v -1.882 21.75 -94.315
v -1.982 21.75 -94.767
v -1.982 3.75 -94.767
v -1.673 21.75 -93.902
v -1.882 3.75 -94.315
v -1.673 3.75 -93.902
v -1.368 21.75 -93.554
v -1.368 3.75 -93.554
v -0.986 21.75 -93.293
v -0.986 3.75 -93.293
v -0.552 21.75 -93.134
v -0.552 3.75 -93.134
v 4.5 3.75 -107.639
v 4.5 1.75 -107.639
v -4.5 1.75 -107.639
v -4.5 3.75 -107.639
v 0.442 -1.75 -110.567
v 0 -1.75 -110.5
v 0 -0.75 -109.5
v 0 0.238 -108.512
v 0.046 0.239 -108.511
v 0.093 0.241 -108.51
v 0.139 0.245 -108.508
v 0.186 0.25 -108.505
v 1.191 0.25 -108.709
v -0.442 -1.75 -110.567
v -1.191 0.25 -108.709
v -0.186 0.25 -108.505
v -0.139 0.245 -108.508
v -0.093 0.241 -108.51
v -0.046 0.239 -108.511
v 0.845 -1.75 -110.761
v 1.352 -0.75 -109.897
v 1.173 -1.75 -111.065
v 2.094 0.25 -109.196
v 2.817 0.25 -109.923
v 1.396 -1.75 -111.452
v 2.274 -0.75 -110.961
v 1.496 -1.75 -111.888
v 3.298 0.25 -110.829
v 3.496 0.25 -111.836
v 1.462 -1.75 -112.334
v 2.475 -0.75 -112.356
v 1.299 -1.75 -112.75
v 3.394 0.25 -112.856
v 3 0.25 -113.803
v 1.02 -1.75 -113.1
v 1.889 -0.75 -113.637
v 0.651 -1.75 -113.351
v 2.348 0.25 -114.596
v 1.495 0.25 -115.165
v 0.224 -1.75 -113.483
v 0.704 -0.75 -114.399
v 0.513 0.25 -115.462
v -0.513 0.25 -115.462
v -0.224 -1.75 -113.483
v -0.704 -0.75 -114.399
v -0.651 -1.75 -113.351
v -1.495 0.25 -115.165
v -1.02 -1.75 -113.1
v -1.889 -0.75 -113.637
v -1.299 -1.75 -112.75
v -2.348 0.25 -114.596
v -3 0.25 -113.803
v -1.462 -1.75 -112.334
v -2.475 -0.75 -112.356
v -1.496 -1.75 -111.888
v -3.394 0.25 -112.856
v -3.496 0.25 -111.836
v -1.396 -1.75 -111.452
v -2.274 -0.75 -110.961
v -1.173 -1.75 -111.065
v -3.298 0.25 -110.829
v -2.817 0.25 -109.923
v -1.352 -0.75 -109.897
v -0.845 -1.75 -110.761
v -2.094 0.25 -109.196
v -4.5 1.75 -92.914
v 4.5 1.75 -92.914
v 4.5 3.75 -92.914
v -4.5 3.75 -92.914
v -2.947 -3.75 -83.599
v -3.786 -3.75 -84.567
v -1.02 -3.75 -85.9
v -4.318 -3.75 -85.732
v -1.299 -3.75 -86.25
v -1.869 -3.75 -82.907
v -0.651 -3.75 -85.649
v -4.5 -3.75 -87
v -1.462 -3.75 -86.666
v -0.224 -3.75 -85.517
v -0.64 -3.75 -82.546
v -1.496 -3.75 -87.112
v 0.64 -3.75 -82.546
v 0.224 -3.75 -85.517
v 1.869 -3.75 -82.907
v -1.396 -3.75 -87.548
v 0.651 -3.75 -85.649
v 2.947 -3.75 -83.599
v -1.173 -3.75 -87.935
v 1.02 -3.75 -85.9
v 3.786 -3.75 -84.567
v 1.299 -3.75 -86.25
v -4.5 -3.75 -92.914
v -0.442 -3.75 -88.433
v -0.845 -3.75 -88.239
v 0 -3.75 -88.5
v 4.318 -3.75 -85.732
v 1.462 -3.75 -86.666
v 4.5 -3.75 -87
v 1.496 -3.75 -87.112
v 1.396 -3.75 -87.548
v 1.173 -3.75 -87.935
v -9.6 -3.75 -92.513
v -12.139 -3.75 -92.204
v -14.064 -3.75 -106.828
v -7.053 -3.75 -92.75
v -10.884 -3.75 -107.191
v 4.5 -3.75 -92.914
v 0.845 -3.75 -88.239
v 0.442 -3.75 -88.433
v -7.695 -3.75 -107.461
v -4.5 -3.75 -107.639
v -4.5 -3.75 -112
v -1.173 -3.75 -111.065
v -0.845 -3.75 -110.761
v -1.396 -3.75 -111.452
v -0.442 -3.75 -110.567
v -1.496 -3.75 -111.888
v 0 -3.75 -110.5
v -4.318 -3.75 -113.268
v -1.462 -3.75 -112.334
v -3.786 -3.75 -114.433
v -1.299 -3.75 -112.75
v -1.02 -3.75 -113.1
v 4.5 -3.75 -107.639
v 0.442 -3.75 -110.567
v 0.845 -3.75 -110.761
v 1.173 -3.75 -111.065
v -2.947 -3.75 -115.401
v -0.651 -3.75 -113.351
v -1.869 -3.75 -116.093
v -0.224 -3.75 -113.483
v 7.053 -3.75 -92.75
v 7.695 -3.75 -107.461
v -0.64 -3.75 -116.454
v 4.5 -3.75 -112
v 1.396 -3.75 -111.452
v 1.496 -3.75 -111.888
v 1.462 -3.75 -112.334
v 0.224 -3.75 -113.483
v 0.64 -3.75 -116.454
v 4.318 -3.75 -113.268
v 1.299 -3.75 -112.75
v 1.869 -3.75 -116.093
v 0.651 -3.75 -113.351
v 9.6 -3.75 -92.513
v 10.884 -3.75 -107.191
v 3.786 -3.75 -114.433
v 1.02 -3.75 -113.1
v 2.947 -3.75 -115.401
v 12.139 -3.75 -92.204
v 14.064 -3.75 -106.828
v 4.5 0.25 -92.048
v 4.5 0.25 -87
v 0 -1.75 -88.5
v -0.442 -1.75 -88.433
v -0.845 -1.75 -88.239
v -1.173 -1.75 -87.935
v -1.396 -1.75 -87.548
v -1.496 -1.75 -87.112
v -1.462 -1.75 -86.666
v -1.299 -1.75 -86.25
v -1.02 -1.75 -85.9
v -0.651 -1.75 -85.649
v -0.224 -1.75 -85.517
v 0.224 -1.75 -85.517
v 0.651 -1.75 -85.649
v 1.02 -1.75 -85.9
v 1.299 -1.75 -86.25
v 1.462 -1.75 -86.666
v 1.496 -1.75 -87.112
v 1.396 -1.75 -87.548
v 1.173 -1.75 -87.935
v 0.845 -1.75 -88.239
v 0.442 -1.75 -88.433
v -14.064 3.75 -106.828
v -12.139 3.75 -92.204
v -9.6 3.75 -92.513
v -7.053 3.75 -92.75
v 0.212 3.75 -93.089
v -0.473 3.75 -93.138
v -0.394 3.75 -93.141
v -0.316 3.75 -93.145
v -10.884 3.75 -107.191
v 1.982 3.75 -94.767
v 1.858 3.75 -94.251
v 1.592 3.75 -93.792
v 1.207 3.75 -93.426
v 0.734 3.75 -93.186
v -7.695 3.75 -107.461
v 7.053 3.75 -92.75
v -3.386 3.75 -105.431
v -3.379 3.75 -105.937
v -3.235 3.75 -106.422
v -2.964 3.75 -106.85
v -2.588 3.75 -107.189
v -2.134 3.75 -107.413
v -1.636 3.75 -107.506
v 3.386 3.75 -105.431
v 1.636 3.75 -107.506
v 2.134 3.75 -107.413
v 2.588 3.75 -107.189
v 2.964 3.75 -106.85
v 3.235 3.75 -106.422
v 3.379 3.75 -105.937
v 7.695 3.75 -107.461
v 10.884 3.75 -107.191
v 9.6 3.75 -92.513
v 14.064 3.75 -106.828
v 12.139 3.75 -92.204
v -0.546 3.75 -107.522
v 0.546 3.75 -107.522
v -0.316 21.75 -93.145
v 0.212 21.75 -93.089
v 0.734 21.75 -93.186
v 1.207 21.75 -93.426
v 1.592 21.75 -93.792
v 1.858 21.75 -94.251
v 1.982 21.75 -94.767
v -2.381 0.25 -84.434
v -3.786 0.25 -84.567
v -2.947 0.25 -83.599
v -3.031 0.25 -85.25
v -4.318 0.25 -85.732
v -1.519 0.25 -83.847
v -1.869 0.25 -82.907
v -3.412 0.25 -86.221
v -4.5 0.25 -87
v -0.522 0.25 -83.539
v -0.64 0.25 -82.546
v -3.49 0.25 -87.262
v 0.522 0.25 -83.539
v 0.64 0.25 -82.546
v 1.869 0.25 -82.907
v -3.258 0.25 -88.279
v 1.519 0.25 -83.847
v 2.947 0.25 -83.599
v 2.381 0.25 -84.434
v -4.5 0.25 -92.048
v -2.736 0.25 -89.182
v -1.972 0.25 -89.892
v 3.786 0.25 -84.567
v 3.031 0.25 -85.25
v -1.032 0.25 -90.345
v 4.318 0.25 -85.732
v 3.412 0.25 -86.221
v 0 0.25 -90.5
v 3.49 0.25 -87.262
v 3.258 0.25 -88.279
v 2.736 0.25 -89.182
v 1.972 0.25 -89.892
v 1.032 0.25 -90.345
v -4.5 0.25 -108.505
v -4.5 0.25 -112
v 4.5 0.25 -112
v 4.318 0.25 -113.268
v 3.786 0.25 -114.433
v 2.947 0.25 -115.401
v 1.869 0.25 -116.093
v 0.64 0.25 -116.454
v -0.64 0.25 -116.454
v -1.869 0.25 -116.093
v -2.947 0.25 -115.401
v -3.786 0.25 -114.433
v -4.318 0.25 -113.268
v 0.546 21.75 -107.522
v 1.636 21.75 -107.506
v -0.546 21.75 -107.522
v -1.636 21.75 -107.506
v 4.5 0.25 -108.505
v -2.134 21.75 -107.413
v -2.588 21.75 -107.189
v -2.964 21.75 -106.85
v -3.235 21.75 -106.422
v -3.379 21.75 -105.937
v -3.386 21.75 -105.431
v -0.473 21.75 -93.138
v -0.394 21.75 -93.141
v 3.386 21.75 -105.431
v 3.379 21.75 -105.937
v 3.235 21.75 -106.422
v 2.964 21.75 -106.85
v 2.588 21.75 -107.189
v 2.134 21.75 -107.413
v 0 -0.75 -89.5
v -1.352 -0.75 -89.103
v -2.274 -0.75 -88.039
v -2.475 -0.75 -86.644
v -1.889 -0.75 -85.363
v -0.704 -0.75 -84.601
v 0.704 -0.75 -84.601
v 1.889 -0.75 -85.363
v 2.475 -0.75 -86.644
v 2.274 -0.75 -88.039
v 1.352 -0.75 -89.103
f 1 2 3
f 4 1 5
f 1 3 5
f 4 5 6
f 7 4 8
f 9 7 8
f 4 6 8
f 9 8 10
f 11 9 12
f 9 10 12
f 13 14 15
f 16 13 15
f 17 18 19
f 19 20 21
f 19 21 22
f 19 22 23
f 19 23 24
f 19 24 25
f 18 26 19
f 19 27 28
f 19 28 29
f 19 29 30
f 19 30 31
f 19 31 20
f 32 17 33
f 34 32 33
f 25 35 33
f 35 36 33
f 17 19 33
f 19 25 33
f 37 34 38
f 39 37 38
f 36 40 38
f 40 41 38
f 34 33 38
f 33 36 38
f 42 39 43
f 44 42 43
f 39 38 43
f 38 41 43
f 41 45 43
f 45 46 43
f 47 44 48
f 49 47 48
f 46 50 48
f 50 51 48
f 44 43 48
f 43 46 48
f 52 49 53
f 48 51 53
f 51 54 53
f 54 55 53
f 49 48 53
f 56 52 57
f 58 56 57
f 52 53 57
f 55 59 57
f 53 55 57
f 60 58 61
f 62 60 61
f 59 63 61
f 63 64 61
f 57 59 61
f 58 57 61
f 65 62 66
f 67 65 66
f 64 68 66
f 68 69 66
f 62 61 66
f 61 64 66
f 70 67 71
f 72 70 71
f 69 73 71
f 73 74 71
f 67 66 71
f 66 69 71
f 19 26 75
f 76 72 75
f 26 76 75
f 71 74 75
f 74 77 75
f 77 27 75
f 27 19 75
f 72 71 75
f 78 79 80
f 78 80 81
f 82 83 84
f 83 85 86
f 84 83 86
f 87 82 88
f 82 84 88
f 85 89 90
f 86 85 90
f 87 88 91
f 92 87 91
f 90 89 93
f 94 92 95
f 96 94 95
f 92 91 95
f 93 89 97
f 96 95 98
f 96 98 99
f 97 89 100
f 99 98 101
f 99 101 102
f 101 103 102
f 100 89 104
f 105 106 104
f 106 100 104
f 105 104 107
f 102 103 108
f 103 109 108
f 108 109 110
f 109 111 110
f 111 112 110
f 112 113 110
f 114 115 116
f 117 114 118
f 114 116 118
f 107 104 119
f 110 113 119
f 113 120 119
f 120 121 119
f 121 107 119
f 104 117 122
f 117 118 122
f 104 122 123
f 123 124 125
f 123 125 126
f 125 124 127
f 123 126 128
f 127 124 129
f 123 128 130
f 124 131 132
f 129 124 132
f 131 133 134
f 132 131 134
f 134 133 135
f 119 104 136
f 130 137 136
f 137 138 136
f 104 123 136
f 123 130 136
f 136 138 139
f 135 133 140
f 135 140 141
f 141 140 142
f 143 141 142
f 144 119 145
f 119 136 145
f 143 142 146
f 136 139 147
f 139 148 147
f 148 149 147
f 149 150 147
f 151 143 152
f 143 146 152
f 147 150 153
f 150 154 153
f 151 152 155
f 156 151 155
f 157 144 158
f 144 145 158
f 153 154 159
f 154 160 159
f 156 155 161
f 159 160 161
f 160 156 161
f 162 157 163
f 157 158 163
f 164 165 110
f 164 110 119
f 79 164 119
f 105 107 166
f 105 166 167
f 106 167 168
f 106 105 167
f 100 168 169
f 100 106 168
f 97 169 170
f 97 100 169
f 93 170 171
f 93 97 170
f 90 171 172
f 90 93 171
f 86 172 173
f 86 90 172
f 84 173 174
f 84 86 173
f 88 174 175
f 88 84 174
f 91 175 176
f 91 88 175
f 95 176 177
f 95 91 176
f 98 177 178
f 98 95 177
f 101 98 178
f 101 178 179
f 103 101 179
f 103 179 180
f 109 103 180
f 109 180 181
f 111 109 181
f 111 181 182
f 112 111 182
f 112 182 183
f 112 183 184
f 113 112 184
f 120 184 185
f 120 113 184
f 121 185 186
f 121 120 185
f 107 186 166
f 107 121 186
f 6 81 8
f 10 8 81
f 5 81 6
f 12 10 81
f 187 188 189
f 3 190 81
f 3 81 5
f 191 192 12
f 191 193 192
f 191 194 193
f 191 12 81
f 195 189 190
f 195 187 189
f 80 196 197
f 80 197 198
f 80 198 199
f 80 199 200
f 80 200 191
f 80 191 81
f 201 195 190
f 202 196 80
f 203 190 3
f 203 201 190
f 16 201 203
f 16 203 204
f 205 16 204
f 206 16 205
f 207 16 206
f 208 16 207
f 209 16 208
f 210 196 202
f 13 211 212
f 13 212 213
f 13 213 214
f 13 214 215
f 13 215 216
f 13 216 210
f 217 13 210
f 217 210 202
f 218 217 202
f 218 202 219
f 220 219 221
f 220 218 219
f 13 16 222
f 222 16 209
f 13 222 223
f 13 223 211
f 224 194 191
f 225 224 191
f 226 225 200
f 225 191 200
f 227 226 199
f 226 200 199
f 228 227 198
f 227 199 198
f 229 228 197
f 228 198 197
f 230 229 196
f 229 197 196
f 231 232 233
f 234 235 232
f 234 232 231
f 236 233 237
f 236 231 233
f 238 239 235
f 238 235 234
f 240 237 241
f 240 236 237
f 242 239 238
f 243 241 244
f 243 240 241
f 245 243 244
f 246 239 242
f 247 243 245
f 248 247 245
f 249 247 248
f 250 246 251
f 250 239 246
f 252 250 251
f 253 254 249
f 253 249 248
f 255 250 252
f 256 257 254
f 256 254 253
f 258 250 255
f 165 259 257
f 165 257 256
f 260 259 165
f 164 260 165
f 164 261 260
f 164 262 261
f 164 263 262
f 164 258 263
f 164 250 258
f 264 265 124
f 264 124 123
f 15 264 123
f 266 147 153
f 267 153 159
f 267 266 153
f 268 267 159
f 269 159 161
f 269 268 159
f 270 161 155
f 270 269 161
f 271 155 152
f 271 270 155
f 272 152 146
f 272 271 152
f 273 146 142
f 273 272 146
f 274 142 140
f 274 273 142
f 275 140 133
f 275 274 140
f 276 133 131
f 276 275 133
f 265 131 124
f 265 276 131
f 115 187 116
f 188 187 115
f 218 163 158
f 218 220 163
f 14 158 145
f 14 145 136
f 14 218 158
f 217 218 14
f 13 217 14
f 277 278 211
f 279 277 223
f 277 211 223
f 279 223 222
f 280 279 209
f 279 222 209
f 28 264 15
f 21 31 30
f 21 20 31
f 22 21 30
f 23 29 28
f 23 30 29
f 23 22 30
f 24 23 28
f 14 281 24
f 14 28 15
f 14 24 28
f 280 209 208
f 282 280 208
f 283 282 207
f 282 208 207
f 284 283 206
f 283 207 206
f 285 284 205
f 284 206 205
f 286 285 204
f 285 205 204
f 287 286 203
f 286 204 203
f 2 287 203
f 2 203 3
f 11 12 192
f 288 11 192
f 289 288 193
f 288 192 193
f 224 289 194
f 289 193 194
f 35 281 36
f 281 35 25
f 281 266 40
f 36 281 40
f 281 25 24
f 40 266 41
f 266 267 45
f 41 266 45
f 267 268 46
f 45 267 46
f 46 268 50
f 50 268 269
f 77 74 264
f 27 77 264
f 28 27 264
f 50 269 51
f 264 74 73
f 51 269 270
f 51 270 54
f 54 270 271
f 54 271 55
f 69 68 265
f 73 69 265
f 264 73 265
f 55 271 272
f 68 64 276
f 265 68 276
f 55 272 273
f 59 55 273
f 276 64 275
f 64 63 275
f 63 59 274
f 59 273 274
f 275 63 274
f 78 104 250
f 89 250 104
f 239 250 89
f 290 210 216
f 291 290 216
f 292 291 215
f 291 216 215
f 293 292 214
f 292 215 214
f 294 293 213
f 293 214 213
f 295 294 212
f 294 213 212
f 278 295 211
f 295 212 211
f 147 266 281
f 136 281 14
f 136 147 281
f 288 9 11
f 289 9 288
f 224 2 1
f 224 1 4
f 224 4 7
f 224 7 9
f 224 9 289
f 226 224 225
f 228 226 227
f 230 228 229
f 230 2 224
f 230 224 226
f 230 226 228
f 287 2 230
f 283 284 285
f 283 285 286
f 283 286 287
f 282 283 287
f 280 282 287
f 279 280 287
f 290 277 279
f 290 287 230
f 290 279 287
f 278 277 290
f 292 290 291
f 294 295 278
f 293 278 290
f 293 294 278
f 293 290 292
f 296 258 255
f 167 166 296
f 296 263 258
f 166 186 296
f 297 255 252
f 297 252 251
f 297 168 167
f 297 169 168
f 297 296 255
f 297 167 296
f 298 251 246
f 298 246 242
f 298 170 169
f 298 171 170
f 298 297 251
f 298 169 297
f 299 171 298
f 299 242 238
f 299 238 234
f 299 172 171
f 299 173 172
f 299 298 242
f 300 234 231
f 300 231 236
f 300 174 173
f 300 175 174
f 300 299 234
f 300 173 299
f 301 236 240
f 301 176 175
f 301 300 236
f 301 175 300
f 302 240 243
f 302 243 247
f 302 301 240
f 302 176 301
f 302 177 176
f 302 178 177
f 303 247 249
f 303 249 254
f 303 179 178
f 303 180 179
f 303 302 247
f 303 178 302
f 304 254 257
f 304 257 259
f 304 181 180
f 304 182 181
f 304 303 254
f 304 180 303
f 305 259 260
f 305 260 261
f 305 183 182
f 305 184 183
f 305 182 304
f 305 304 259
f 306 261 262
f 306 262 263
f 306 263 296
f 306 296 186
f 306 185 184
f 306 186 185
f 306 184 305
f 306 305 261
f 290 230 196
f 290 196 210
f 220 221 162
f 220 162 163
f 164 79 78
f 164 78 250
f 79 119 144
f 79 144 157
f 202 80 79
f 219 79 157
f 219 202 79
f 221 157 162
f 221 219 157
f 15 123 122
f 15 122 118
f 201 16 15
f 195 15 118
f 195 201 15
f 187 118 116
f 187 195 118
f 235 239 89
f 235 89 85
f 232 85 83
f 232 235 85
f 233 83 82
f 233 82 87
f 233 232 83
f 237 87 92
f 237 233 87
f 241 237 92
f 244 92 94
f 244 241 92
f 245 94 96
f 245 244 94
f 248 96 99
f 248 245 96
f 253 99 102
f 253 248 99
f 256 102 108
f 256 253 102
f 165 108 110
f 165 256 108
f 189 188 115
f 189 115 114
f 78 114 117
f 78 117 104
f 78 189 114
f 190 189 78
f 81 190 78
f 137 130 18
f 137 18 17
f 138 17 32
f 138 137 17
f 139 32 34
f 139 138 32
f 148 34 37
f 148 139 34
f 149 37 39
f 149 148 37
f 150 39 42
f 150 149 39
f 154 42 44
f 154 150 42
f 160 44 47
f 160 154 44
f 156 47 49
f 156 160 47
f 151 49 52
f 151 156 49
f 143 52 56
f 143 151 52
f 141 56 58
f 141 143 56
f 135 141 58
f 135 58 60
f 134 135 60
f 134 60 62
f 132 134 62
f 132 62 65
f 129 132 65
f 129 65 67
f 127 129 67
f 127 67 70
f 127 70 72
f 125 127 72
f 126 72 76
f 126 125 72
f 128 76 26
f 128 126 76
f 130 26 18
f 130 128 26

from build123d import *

# Parameters (mm, degrees)
SKETCH1_R                = 1.5
BOSS_EXTRUDE1_DEPTH      = 3.75
BOSS_EXTRUDE2_DEPTH      = 18
BOSS_EXTRUDE2_DEPTH_BACK = 7.5
CUT_EXTRUDE1_DEPTH       = 119.718371128
CUT_EXTRUDE1_DEPTH_BACK  = 3.5
SKETCH4_R                = 1.5
CHAMFER1_SIZE            = 2


with BuildPart() as part:
    # Sketch1 → Boss-Extrude1 (new, symmetric)
    with BuildSketch(Plane(origin=(0, 0, 0), x_dir=(1, 0, 0), z_dir=(0, 1, 0))):
        with BuildLine():
            Line((-14.064197212, 106.828183813), (-12.138935876, 92.204372108))
            ThreePointArc((-12.138935876, 92.204372108), (-8.327034738, 92.640714043), (-4.5, 92.914191088))
            Line((-4.5, 92.914191088), (-4.5, 90.60548378))
            Line((-4.5, 90.60548378), (-4.5, 89.092083998))
            Line((-4.5, 89.092083998), (-4.5, 87))
            ThreePointArc((-4.5, 87), (0, 82.5), (4.5, 87))
            Line((4.5, 87), (4.5, 89.092083998))
            Line((4.5, 89.092083998), (4.5, 90.60548378))
            Line((4.5, 90.60548378), (4.5, 92.914191088))
            ThreePointArc((4.5, 92.914191088), (8.327034738, 92.640714043), (12.138935876, 92.204372108))
            Line((12.138935876, 92.204372108), (14.064197212, 106.828183813))
            ThreePointArc((14.064197212, 106.828183813), (9.290945642, 107.337913445), (4.5, 107.638902983))
            Line((4.5, 107.638902983), (4.5, 109.907916002))
            Line((4.5, 109.907916002), (4.5, 112))
            ThreePointArc((4.5, 112), (0, 116.5), (-4.5, 112))
            Line((-4.5, 112), (-4.5, 109.907916002))
            Line((-4.5, 109.907916002), (-4.5, 107.638902983))
            ThreePointArc((-4.5, 107.638902983), (-9.290945642, 107.337913445), (-14.064197212, 106.828183813))
        make_face()
        with Locations(Location((0, 112, 0), (0, 0, 270))):
            Circle(SKETCH1_R, mode=Mode.SUBTRACT)
        with Locations(Location((0, 87, 0), (0, 0, 90))):
            Circle(SKETCH1_R, mode=Mode.SUBTRACT)
    extrude(amount=BOSS_EXTRUDE1_DEPTH, both=True)

    # Sketch3 → Boss-Extrude2 (add, two sides: drawn at the far end of the back side and taken through both)
    with BuildSketch(Plane(origin=(0, 3.75, 0), x_dir=(1, 0, 0), z_dir=(0, 1, 0)).offset(-BOSS_EXTRUDE2_DEPTH_BACK)):
        with BuildLine():
            Line((1.982080861, 94.766924481), (3.385996272, 105.430720736))
            ThreePointArc((3.385996272, 105.430720736), (2.964387866, 106.850395337), (1.636401853, 107.505897258))
            ThreePointArc((1.636401853, 107.505897258), (0, 107.524356631), (-1.636401853, 107.505897258))
            ThreePointArc((-1.636401853, 107.505897258), (-2.964387866, 106.850395337), (-3.385996272, 105.430720736))
            Line((-3.385996272, 105.430720736), (-1.982080861, 94.766924481))
            ThreePointArc((-1.982080861, 94.766924481), (-1.531449923, 93.718749438), (-0.551584549, 93.134281295))
            ThreePointArc((-0.551584549, 93.134281295), (-0.433742315, 93.139694116), (-0.315893802, 93.144968474))
            ThreePointArc((-0.315893802, 93.144968474), (1.206800808, 93.426480911), (1.982080861, 94.766924481))
        make_face()
    extrude(amount=BOSS_EXTRUDE2_DEPTH + BOSS_EXTRUDE2_DEPTH_BACK)

    # Sketch4 → Cut-Extrude1 (cut, two sides: drawn at the far end of the back side and taken through both)
    # profile 1 of 2: a face of its own
    with BuildSketch(Plane(origin=(0, 3.75, 0), x_dir=(1, 0, 0), z_dir=(0, 1, 0)).offset(-CUT_EXTRUDE1_DEPTH_BACK)):
        with BuildLine():
            Line((-4.5, 91.393652938), (-4.5, 87.032555921))
            ThreePointArc((-4.5, 87.032555921), (0, 82.41632562), (4.5, 87.032555921))
            Line((4.5, 87.032555921), (4.5, 91.393652938))
            Line((4.5, 91.393652938), (4.5, 92.914191088))
            Line((4.5, 92.914191088), (-4.5, 92.914191088))
            Line((-4.5, 92.914191088), (-4.5, 91.393652938))
        make_face()
        with Locations(Location((0, 87, 0), (0, 0, 90))):
            Circle(SKETCH4_R, mode=Mode.SUBTRACT)
    # profile 2 of 2: a face of its own
    with BuildSketch(Plane(origin=(0, 3.75, 0), x_dir=(1, 0, 0), z_dir=(0, 1, 0)).offset(-CUT_EXTRUDE1_DEPTH_BACK)):
        with BuildLine():
            Line((4.5, 107.638902983), (-4.5, 107.638902983))
            Line((-4.5, 107.638902983), (-4.5, 112))
            ThreePointArc((-4.5, 112), (0, 116.5), (4.5, 112))
            Line((4.5, 112), (4.5, 107.638902983))
        make_face()
        with Locations(Location((0, 112, 0), (0, 0, 270))):
            Circle(SKETCH4_R, mode=Mode.SUBTRACT)
    extrude(amount=CUT_EXTRUDE1_DEPTH + CUT_EXTRUDE1_DEPTH_BACK, mode=Mode.SUBTRACT)

    # Chamfer1
    chamfer1_edges = [part.edges().sort_by_distance(p)[0] for p in [
        (0, 0.25, -85.5),
        (0, 0.25, -113.5),
    ]]
    chamfer(chamfer1_edges, length=CHAMFER1_SIZE)

    # Chamfer2
    # the kernel refuses this chamfer: 1.5, 0.866025404 mm, written as the material it adds along each edge
    with BuildSketch(Plane(origin=(4.5, 0.25, -107.638902983), x_dir=(-1.576335496707441e-15, -0.057893862402670165, -0.9983227437537927), z_dir=(-1, 0, 0))) as chamfer2_piece_1:
        with BuildLine():
            Line((0.897530793, 0), (-0.119798729, -1.547621671))
            Line((-0.119798729, -1.547621671), (-0.149748412, -1.545884855))
            ThreePointArc((-0.149748412, -1.545884855), (-0.074874206, -0.772942428), (-0.029949682, 0.001736816))
            Line((-0.029949682, 0.001736816), (0.001736816, 0.029949682))
            ThreePointArc((0.001736816, 0.029949682), (0.448998086, 0.004012497), (0.899267609, 0.029949682))
            Line((0.899267609, 0.029949682), (0.897530793, 0))
        make_face()
    extrude(amount=9)
    with BuildSketch(Plane(origin=(4.5, 0.25, -92.914191088), x_dir=(0, 0.9998132206222078, -0.019326765612701434), z_dir=(-1, 0, 0))) as chamfer2_piece_2_section:
        with BuildLine():
            Line((1.552251453, 0), (-0.069269092, -0.894853797))
            Line((-0.069269092, -0.894853797), (-0.099263488, -0.894273994))
            ThreePointArc((-0.099263488, -0.894273994), (-0.038653033, -0.447349219), (-0.029994397, 0.000579803))
            Line((-0.029994397, 0.000579803), (0.000579803, 0.029994397))
            ThreePointArc((0.000579803, 0.029994397), (0.776415628, 0.014997198), (1.552831256, 0.029994397))
            Line((1.552831256, 0.029994397), (1.552251453, 0))
        make_face()
    chamfer2_piece_2 = extrude(amount=9, mode=Mode.PRIVATE)
    chamfer2_piece_2 = chamfer2_piece_2 & Plane(origin=(0, 0.749739916, -3.026761488), x_dir=(-0.13487706529406074, 0, -0.9908623402156638), z_dir=(0, 1, 0)) * Cylinder(90, 25, mode=Mode.PRIVATE)
    add(chamfer2_piece_2)


solid = part.part
